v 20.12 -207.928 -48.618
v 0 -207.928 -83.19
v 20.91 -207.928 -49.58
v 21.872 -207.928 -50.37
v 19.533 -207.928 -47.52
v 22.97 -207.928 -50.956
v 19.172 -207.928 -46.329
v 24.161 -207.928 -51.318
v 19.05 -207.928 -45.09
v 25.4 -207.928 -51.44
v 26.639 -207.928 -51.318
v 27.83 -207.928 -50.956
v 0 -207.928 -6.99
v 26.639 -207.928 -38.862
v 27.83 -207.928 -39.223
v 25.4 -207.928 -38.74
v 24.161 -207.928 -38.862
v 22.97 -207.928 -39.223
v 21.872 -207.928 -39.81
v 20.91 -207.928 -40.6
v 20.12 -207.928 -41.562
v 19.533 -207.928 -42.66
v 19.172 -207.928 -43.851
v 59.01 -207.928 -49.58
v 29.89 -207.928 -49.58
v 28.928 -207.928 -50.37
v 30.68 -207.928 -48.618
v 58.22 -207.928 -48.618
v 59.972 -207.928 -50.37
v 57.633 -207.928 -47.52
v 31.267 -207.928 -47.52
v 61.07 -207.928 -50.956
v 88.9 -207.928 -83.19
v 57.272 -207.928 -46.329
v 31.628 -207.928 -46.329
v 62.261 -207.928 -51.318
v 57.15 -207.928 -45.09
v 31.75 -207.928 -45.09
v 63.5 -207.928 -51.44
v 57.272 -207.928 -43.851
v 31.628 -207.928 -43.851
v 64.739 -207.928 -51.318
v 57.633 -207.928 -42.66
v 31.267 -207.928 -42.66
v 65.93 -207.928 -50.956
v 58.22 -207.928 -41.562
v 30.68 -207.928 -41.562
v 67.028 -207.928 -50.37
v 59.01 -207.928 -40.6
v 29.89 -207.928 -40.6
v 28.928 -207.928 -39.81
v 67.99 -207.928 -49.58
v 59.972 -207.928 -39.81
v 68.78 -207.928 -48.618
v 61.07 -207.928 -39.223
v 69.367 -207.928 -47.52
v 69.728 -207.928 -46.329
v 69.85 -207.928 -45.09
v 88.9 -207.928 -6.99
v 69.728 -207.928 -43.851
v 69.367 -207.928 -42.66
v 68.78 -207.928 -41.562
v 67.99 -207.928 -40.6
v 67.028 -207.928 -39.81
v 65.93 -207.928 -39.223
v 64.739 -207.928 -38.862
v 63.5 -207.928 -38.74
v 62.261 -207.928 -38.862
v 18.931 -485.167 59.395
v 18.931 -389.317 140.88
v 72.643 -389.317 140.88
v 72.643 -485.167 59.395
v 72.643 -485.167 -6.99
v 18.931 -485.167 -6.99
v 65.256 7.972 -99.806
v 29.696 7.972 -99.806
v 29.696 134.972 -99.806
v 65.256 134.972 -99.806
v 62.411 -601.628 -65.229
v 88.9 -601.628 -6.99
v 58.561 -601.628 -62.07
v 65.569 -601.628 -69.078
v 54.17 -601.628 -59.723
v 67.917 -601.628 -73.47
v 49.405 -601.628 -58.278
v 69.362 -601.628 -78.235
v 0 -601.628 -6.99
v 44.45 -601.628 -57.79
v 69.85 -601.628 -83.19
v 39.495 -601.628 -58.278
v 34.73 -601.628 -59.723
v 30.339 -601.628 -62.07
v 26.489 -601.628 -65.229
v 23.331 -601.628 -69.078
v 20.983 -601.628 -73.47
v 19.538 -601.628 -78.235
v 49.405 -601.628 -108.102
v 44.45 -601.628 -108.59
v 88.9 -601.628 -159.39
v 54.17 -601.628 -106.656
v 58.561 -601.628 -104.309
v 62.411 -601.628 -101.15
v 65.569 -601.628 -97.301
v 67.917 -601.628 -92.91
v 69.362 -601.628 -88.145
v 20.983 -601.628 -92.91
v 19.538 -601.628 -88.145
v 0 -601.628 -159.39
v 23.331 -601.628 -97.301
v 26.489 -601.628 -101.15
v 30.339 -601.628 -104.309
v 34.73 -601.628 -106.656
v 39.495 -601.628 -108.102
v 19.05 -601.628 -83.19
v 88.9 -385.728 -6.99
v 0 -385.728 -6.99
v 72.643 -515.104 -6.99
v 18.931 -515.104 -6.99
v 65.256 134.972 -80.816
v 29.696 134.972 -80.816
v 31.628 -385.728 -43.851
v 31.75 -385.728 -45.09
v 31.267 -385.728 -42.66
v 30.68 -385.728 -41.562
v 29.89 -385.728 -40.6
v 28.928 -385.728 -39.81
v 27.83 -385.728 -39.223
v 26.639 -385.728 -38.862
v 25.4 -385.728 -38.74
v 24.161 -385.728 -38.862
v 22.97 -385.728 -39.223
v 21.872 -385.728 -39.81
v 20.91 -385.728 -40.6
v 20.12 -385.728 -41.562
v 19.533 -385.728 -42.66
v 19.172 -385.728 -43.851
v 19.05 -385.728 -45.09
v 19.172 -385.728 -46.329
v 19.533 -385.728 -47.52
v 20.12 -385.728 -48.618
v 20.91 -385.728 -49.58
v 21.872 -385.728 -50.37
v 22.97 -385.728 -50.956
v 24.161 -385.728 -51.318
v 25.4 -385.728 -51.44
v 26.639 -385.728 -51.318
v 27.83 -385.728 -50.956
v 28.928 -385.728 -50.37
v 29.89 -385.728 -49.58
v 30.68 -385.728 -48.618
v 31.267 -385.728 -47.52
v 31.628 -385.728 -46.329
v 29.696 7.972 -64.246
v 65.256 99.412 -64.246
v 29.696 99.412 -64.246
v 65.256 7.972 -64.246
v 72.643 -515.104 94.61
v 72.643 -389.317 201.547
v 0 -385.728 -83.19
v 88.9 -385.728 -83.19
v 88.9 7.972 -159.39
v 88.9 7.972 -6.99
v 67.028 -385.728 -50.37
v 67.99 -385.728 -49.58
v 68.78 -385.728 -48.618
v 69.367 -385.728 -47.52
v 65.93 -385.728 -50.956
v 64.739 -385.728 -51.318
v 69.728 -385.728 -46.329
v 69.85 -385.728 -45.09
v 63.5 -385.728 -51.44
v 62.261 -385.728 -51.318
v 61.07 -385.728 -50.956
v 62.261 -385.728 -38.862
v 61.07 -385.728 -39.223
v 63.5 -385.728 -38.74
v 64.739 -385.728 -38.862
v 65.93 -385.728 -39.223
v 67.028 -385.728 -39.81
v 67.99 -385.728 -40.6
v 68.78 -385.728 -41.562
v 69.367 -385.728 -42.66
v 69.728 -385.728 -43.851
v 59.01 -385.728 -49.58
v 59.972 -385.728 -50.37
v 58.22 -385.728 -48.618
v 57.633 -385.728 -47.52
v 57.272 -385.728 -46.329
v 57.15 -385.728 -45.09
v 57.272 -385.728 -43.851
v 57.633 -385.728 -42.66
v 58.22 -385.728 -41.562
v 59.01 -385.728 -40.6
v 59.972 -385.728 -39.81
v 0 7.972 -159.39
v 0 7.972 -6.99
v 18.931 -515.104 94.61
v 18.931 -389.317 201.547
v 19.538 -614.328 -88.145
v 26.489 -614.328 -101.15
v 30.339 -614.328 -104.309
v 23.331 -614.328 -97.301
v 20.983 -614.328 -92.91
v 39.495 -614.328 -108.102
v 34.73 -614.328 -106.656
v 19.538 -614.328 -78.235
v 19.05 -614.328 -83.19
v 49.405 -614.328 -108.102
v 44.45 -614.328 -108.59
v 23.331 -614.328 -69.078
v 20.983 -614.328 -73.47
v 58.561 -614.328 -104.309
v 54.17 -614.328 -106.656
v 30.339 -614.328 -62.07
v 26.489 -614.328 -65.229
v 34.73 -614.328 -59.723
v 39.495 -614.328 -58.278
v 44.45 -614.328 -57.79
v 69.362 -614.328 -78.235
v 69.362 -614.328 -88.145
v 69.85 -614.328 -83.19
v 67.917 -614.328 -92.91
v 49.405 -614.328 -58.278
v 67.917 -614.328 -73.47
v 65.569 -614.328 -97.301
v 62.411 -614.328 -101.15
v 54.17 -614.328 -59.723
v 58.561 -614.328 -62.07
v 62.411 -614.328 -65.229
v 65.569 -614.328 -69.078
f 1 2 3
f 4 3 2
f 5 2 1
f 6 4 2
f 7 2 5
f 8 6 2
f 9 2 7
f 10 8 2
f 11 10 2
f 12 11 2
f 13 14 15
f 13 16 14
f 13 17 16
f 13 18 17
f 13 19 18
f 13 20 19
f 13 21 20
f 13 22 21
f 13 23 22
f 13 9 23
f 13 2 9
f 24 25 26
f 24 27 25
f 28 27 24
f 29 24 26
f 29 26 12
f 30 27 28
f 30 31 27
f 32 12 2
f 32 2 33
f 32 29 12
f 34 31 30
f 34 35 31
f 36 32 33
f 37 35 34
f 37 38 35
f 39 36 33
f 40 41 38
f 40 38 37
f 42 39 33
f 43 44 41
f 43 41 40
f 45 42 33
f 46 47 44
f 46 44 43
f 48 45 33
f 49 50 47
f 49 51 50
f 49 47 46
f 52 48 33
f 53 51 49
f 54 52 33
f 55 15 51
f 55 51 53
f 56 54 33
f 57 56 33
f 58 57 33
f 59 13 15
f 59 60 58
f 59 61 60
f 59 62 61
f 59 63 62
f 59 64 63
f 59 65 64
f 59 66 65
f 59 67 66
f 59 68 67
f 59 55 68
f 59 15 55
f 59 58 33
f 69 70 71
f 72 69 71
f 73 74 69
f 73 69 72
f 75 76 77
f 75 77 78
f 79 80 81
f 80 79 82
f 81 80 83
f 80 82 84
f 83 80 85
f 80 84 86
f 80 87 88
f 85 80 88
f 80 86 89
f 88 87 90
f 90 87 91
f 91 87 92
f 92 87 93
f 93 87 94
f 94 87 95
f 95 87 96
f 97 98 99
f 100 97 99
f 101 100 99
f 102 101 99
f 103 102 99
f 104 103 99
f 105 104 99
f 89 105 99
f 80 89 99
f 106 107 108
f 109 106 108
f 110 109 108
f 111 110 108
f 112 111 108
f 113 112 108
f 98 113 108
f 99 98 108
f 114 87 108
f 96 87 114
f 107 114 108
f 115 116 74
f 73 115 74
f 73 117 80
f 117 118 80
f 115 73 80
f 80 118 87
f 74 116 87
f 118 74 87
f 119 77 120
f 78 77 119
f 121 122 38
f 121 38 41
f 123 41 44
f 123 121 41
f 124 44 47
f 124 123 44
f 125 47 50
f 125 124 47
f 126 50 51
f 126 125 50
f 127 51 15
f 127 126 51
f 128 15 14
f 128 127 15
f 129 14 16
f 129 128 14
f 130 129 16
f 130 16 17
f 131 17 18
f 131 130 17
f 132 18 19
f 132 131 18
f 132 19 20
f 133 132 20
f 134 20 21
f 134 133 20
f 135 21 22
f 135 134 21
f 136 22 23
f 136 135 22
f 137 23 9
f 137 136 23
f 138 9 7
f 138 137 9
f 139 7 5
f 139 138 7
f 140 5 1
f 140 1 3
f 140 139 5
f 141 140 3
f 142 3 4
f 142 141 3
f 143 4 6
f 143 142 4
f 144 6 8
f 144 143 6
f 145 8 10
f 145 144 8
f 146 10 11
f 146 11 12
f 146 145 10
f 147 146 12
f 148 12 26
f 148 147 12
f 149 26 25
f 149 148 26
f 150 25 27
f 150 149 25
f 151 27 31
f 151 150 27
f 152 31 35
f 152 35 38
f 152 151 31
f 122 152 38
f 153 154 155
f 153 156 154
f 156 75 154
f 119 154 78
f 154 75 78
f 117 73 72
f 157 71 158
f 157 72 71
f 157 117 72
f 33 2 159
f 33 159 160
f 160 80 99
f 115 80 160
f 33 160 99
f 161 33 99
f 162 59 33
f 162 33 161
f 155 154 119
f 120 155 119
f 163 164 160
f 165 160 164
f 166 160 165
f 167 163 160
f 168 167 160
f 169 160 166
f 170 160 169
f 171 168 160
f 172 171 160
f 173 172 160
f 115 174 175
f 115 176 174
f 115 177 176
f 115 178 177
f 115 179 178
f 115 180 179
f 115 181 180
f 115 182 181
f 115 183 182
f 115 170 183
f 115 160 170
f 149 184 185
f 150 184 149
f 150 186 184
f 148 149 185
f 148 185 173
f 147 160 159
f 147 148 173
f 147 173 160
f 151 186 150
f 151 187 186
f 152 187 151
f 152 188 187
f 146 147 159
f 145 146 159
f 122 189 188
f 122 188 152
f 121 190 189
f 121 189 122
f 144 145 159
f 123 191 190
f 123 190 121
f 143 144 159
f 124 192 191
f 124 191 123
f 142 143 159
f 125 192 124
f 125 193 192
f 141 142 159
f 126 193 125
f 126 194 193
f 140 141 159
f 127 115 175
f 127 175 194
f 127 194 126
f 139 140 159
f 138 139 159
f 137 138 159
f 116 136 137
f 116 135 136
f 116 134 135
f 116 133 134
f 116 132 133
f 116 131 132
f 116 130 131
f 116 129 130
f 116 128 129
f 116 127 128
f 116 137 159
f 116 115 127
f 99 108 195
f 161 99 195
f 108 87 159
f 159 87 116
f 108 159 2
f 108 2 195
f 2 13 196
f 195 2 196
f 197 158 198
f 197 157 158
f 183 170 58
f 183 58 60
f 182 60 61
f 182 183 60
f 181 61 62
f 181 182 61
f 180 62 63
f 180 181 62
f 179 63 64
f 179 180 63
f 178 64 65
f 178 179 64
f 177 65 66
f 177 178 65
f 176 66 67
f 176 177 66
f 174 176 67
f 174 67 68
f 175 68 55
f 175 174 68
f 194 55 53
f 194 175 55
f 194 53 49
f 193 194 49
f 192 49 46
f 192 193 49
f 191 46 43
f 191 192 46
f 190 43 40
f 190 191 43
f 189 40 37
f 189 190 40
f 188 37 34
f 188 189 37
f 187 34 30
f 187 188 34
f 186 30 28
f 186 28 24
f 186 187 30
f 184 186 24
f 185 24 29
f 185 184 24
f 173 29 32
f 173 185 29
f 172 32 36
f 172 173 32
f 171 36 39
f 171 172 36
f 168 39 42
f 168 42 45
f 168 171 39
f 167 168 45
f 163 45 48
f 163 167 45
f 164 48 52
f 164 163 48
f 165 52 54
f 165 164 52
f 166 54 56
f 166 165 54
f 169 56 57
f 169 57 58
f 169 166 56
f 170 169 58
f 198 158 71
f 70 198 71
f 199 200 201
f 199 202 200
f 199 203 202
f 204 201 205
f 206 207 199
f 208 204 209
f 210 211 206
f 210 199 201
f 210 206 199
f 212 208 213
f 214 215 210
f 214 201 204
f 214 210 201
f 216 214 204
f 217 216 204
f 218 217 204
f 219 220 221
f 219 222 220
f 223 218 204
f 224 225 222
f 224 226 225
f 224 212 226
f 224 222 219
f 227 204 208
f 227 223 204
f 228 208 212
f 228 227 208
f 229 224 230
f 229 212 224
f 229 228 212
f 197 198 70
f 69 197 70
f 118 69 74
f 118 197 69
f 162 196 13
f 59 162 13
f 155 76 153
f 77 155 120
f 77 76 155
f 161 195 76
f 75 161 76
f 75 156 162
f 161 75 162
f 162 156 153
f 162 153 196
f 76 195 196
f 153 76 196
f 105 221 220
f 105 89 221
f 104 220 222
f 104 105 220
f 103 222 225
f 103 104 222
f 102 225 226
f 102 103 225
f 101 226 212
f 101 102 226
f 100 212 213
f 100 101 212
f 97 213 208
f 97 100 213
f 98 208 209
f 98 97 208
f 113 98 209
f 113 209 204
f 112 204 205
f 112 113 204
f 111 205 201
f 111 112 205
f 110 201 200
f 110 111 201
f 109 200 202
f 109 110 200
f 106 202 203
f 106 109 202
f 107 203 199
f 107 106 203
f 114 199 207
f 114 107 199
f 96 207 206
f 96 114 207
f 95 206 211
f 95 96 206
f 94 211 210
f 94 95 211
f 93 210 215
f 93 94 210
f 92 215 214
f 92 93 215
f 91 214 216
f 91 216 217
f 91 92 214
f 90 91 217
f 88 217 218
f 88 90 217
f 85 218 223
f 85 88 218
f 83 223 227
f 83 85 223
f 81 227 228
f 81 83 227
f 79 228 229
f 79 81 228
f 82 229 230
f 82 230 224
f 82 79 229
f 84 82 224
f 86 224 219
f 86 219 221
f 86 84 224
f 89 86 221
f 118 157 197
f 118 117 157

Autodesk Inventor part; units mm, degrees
ref_plane "YZ Plane" through (0, 0, 0) normal (1, 0, 0) x (0, 1, 0)
ref_plane "XZ Plane" through (0, 0, 0) normal (0, 1, 0) x (-1, 0, 0)
ref_plane "XY Plane" through (0, 0, 0) normal (0, 0, 1) x (1, 0, 0)
sketch "Sketch1" plane through (0, 0, 0) normal (1, 0, 0) x (0, 1, 0)
  line L0 (7.9725, -6.9898) -> (-601.6275, -6.9898)
  line L1 (-601.6275, -6.9898) -> (-601.6275, -159.3898)
  line L2 (-601.6275, -159.3898) -> (7.9725, -159.3898)
  line L3 (7.9725, -159.3898) -> (7.9725, -6.9898)
  point P0 (0, 0)
  dimension "d0" = 609.6
  dimension "d1" = 152.4
extrude "Extrusion1" add sketch "Sketch1" along normal blind 88.9
sketch "Sketch2" plane through (0, -601.6275, -6.9898) normal (0, 0, 1) x (1, 0, 0)
  line L0 (0, 0) -> (0, 609.6) projected
  line L1 (0, 609.6) -> (0, 393.7)
  line L2 (0, 0) -> (88.9, 0) projected
  line L3 (0, 0) -> (0, 215.9)
  line L4 (88.9, 0) -> (88.9, 609.6) projected
  line L5 (0, 393.7) -> (88.9, 393.7)
  line L6 (88.9, 393.7) -> (88.9, 215.9)
  line L7 (88.9, 215.9) -> (0, 215.9)
  line L8 (0, 215.9) -> (0, 393.7)
  line L9 (0, 393.7) -> (0, 215.9)
  point P0 (0, 601.6275)
  point P1 (0, 215.9)
  dimension "d4" = 215.9
  dimension "d5" = 215.9
extrude "Extrusion2" cut sketch "Sketch2" against normal blind 76.2 contours L0 L5 L4 L7
sketch "Sketch3" plane through (88.9, 0, 0) normal (1, 0, 0) x (0, 0, -1)
  point P0 (0, 0)
sketch "Sketch4" plane through (0, -601.6275, -6.9898) normal (0, 0, 1) x (1, 0, 0)
  line L0 (18.9312, 116.4608) -> (72.6429, 116.4608)
  line L1 (72.6429, 116.4608) -> (72.6429, 86.5231)
  line L2 (72.6429, 86.5231) -> (18.9312, 86.5231)
  line L3 (18.9312, 86.5231) -> (18.9312, 116.4608)
  point P0 (0, 601.6275)
extrude "Extrusion3" add sketch "Sketch4" along normal blind 101.6
sketch "Sketch5" plane through (72.6429, -515.1044, -6.9898) normal (1, 0, 0) x (0, 0, -1)
  line L0 (-101.6, 0) -> (-66.3848, 29.9377)
  line L1 (0, 29.9377) -> (-101.6, 29.9377) projected
  line L2 (-101.6, 0) -> (-101.6, 29.9377) projected
  line L3 (-101.6, 0) -> (-101.6, 29.9377)
  point P0 (-6.9898, 515.1044)
extrude "Extrusion4" cut sketch "Sketch5" against normal through all
sketch "Sketch6" plane through (18.9312, -515.1044, 94.6102) normal (0, 0.7618887, 0.647708) x (1, 0, 0)
  line L0 (0, 46.221) -> (53.7117, 46.221) projected
  line L1 (53.7117, 77.4079) -> (53.7117, 0) projected
  line L2 (0, 46.221) -> (53.7117, 46.221)
  line L3 (53.7117, 46.221) -> (53.7117, 0)
  line L4 (53.7117, 0) -> (0, 0)
  line L5 (0, 0) -> (0, 46.221)
  point P0 (-18.9312, 405.7197)
extrude "Extrusion5" add sketch "Sketch6" along normal blind 165.1
sketch "Sketch7" plane through (72.6429, -515.1044, -6.9898) normal (1, 0, 0) x (0, 0, -1)
  point P0 (-6.9898, 515.1044)
sketch "Sketch8" plane through (72.6429, -515.1044, -6.9898) normal (1, 0, 0) x (0, 0, -1)
  line L0 (-173.3214, 155.7255) -> (-208.5366, 125.7878) projected
  line L1 (-208.5366, 125.7878) -> (-147.8703, 125.7878)
  line L2 (-66.3848, 29.9377) -> (-173.3214, 155.7255) projected
  line L3 (-173.3214, 155.7255) -> (-208.5366, 125.7878)
  line L4 (-147.8703, 125.7878) -> (-173.3214, 155.7255)
  point P0 (-6.9898, 515.1044)
extrude "Extrusion6" cut sketch "Sketch8" against normal through all
sketch "Sketch9" plane through (72.6429, -389.3166, 201.5467) normal (0, 1, 0) x (1, 0, 0)
  point P0 (-72.6429, 201.5467)
sketch "Sketch10" plane through (0, -385.7275, -6.9898) normal (0, 1, 0) x (1, 0, 0)
  point P0 (0, -6.9898)
sketch "Sketch11" plane through (0, -385.7275, -6.9898) normal (0, 1, 0) x (1, 0, 0)
  point P0 (0, -6.9898)
sketch "Sketch12" plane through (0, -385.7275, -6.9898) normal (0, 1, 0) x (1, 0, 0)
  point P0 (0, -6.9898)
sketch "Sketch13" plane through (0, 0, 0) normal (-1, 0, 0) x (0, 0, 1)
  point P0 (0, 0)
sketch "Sketch14" plane through (0, -385.7275, -6.9898) normal (0, 1, 0) x (1, 0, 0)
  line L0 (88.9, 76.2) -> (0, 76.2) projected
  line L1 (0, 0) -> (0, 76.2) projected
  line L2 (88.9, 76.2) -> (0, 76.2)
  line L3 (88.9, 76.2) -> (88.9, 0) projected
  line L4 (0, 76.2) -> (88.9, 76.2)
  line L5 (88.9, 76.2) -> (0, 76.2)
  line L6 (0, 76.2) -> (0, 0)
  line L7 (0, 0) -> (88.9, 0)
  line L8 (88.9, 0) -> (88.9, 76.2)
  point P0 (0, -6.9898)
sketch "Sketch15" plane through (0, -385.7275, -6.9898) normal (0, 1, 0) x (1, 0, 0)
  line L0 (88.9, 76.2) -> (88.9, 0) projected
  line L1 (88.9, 38.1) -> (0, 38.1)
  line L2 (0, 0) -> (0, 76.2) projected
  line L3 (88.9, 76.2) -> (0, 76.2)
  circle A0 centre (63.5, 38.1) radius 6.35
  circle A1 centre (25.4, 38.1) radius 6.35
  point P0 (0, -6.9898)
  dimension "d20" = 12.7
  dimension "d21" = 12.7
extrude "Extrusion7" add sketch "Sketch15" along normal blind 177.8 contours A0 L1 | L1 A0 | A1 L1 | L1 A1
sketch "Sketch16" plane through (0, 7.9725, -6.9898) normal (0, 1, 0) x (1, 0, 0)
  line L0 (29.6959, 92.8158) -> (65.2559, 92.8158)
  line L1 (65.2559, 92.8158) -> (65.2559, 57.2558)
  line L2 (65.2559, 57.2558) -> (29.6959, 57.2558)
  line L3 (29.6959, 57.2558) -> (29.6959, 92.8158)
  point P0 (0, -6.9898)
  dimension "d24" = 35.56
  dimension "d25" = 35.56
extrude "Extrusion8" add sketch "Sketch16" along normal blind 127
sketch "Sketch17" plane through (29.6959, 7.9725, -64.2457) normal (0, 0, 1) x (1, 0, 0)
  line L0 (0, 127) -> (35.56, 127) projected
  line L1 (35.56, 0) -> (35.56, 127) projected
  line L2 (0, 127) -> (35.56, 127)
  line L3 (35.56, 127) -> (35.56, 91.44)
  line L4 (35.56, 91.44) -> (0, 91.44)
  line L5 (0, 91.44) -> (0, 127)
  point P0 (-29.6959, -7.9725)
  dimension "d28" = 35.56
extrude "Extrusion9" add sketch "Sketch17" along normal blind 127
sketch "Sketch18" plane through (65.2559, 7.9725, -64.2457) normal (1, 0, 0) x (0, 0, -1)
  line L0 (0, 91.44) -> (-127, 91.44) projected
  line L1 (-64.2457, 91.44) -> (-45.72, 127)
  line L2 (35.56, 127) -> (-127, 127) projected
  line L3 (-45.72, 127) -> (-127, 127)
  line L4 (-127, 127) -> (-127, 91.44) projected
  line L5 (-127, 91.44) -> (-64.2457, 91.44)
  line L6 (-127, 127) -> (-127, 91.44)
  line L7 (35.56, 127) -> (-127, 127) projected
  line L8 (0, 127) -> (-14.8626, 91.44)
  line L9 (-64.2457, 91.44) -> (-14.8626, 91.44)
  line L10 (-14.8626, 91.44) -> (0, 127)
  line L11 (-45.72, 127) -> (-127, 127)
  line L12 (0, 127) -> (-49.9714, 127)
  point P0 (-64.2457, -7.9725)
extrude "Extrusion10" cut sketch "Sketch18" against normal through all contours L0 L4 L2 L1
sketch "Sketch19" plane through (65.2559, 7.9725, -64.2457) normal (1, 0, 0) x (0, 0, -1)
  line L0 (0, 91.44) -> (-64.2457, 91.44) projected
  line L1 (-32.1228, 91.44) -> (-14.9944, 127)
  line L2 (35.56, 127) -> (-45.72, 127) projected
  line L3 (-32.1228, 91.44) -> (-64.2457, 91.44)
  line L4 (-64.2457, 91.44) -> (-45.72, 127) projected
  line L5 (-64.2457, 91.44) -> (-45.72, 127)
  line L6 (-45.72, 127) -> (-14.9944, 127)
  point P0 (-64.2457, -7.9725)
extrude "Extrusion11" cut sketch "Sketch19" against normal through all
sketch "Sketch20" plane through (65.2559, 7.9725, -64.2457) normal (1, 0, 0) x (0, 0, -1)
  line L0 (35.56, 127) -> (-14.9944, 127) projected
  line L1 (-0.2658, 127) -> (-21.0098, 91.44)
  line L2 (0, 91.44) -> (-32.1228, 91.44) projected
  line L3 (-21.0098, 91.44) -> (-32.1228, 91.44)
  line L4 (-32.1228, 91.44) -> (-14.9944, 127) projected
  line L5 (-32.1228, 91.44) -> (-14.9944, 127)
  line L6 (-14.9944, 127) -> (-0.2658, 127)
  point P0 (-64.2457, -7.9725)
extrude "Extrusion12" cut sketch "Sketch20" against normal through all
sketch "Sketch21" plane through (0, 7.9725, -6.9898) normal (0, 1, 0) x (1, 0, 0)
  point P0 (0, -6.9898)
sketch "Sketch22" plane through (65.2559, 7.9725, -64.2457) normal (1, 0, 0) x (0, 0, -1)
  line L0 (-0.2658, 127) -> (-21.0098, 91.44) projected
  line L1 (-21.0098, 91.44) -> (-0.2658, 127)
  line L2 (-0.2658, 127) -> (16.5705, 127)
  line L3 (35.56, 127) -> (-0.2658, 127) projected
  line L4 (0, 0) -> (0, 91.44) projected
  line L5 (0, 91.44) -> (16.5705, 127)
  line L6 (0, 91.44) -> (-21.0098, 91.44) projected
  line L7 (0, 91.44) -> (-21.0098, 91.44)
  point P0 (-64.2457, -7.9725)
extrude "Extrusion13" cut sketch "Sketch22" against normal through all
sketch "Sketch23" plane through (0, -385.7275, -6.9898) normal (0, 1, 0) x (1, 0, 0)
  point P0 (0, -6.9898)
sketch "Sketch24" plane through (0, -601.6275, -159.3898) normal (0, -1, 0) x (1, 0, 0)
  line L0 (0, 152.4) -> (88.9, 152.4) projected
  line L1 (88.9, 152.4) -> (88.9, 0) projected
  line L2 (0, 0) -> (88.9, 0) projected
  line L3 (0, 76.2) -> (88.9, 76.2) projected
  circle A0 centre (44.45, 76.2) radius 25.4
  point P0 (0, 159.3898)
extrude "Extrusion14" add sketch "Sketch24" along normal blind 12.7
properties part number "exploration cuboid" material "Silicon Nitride"
